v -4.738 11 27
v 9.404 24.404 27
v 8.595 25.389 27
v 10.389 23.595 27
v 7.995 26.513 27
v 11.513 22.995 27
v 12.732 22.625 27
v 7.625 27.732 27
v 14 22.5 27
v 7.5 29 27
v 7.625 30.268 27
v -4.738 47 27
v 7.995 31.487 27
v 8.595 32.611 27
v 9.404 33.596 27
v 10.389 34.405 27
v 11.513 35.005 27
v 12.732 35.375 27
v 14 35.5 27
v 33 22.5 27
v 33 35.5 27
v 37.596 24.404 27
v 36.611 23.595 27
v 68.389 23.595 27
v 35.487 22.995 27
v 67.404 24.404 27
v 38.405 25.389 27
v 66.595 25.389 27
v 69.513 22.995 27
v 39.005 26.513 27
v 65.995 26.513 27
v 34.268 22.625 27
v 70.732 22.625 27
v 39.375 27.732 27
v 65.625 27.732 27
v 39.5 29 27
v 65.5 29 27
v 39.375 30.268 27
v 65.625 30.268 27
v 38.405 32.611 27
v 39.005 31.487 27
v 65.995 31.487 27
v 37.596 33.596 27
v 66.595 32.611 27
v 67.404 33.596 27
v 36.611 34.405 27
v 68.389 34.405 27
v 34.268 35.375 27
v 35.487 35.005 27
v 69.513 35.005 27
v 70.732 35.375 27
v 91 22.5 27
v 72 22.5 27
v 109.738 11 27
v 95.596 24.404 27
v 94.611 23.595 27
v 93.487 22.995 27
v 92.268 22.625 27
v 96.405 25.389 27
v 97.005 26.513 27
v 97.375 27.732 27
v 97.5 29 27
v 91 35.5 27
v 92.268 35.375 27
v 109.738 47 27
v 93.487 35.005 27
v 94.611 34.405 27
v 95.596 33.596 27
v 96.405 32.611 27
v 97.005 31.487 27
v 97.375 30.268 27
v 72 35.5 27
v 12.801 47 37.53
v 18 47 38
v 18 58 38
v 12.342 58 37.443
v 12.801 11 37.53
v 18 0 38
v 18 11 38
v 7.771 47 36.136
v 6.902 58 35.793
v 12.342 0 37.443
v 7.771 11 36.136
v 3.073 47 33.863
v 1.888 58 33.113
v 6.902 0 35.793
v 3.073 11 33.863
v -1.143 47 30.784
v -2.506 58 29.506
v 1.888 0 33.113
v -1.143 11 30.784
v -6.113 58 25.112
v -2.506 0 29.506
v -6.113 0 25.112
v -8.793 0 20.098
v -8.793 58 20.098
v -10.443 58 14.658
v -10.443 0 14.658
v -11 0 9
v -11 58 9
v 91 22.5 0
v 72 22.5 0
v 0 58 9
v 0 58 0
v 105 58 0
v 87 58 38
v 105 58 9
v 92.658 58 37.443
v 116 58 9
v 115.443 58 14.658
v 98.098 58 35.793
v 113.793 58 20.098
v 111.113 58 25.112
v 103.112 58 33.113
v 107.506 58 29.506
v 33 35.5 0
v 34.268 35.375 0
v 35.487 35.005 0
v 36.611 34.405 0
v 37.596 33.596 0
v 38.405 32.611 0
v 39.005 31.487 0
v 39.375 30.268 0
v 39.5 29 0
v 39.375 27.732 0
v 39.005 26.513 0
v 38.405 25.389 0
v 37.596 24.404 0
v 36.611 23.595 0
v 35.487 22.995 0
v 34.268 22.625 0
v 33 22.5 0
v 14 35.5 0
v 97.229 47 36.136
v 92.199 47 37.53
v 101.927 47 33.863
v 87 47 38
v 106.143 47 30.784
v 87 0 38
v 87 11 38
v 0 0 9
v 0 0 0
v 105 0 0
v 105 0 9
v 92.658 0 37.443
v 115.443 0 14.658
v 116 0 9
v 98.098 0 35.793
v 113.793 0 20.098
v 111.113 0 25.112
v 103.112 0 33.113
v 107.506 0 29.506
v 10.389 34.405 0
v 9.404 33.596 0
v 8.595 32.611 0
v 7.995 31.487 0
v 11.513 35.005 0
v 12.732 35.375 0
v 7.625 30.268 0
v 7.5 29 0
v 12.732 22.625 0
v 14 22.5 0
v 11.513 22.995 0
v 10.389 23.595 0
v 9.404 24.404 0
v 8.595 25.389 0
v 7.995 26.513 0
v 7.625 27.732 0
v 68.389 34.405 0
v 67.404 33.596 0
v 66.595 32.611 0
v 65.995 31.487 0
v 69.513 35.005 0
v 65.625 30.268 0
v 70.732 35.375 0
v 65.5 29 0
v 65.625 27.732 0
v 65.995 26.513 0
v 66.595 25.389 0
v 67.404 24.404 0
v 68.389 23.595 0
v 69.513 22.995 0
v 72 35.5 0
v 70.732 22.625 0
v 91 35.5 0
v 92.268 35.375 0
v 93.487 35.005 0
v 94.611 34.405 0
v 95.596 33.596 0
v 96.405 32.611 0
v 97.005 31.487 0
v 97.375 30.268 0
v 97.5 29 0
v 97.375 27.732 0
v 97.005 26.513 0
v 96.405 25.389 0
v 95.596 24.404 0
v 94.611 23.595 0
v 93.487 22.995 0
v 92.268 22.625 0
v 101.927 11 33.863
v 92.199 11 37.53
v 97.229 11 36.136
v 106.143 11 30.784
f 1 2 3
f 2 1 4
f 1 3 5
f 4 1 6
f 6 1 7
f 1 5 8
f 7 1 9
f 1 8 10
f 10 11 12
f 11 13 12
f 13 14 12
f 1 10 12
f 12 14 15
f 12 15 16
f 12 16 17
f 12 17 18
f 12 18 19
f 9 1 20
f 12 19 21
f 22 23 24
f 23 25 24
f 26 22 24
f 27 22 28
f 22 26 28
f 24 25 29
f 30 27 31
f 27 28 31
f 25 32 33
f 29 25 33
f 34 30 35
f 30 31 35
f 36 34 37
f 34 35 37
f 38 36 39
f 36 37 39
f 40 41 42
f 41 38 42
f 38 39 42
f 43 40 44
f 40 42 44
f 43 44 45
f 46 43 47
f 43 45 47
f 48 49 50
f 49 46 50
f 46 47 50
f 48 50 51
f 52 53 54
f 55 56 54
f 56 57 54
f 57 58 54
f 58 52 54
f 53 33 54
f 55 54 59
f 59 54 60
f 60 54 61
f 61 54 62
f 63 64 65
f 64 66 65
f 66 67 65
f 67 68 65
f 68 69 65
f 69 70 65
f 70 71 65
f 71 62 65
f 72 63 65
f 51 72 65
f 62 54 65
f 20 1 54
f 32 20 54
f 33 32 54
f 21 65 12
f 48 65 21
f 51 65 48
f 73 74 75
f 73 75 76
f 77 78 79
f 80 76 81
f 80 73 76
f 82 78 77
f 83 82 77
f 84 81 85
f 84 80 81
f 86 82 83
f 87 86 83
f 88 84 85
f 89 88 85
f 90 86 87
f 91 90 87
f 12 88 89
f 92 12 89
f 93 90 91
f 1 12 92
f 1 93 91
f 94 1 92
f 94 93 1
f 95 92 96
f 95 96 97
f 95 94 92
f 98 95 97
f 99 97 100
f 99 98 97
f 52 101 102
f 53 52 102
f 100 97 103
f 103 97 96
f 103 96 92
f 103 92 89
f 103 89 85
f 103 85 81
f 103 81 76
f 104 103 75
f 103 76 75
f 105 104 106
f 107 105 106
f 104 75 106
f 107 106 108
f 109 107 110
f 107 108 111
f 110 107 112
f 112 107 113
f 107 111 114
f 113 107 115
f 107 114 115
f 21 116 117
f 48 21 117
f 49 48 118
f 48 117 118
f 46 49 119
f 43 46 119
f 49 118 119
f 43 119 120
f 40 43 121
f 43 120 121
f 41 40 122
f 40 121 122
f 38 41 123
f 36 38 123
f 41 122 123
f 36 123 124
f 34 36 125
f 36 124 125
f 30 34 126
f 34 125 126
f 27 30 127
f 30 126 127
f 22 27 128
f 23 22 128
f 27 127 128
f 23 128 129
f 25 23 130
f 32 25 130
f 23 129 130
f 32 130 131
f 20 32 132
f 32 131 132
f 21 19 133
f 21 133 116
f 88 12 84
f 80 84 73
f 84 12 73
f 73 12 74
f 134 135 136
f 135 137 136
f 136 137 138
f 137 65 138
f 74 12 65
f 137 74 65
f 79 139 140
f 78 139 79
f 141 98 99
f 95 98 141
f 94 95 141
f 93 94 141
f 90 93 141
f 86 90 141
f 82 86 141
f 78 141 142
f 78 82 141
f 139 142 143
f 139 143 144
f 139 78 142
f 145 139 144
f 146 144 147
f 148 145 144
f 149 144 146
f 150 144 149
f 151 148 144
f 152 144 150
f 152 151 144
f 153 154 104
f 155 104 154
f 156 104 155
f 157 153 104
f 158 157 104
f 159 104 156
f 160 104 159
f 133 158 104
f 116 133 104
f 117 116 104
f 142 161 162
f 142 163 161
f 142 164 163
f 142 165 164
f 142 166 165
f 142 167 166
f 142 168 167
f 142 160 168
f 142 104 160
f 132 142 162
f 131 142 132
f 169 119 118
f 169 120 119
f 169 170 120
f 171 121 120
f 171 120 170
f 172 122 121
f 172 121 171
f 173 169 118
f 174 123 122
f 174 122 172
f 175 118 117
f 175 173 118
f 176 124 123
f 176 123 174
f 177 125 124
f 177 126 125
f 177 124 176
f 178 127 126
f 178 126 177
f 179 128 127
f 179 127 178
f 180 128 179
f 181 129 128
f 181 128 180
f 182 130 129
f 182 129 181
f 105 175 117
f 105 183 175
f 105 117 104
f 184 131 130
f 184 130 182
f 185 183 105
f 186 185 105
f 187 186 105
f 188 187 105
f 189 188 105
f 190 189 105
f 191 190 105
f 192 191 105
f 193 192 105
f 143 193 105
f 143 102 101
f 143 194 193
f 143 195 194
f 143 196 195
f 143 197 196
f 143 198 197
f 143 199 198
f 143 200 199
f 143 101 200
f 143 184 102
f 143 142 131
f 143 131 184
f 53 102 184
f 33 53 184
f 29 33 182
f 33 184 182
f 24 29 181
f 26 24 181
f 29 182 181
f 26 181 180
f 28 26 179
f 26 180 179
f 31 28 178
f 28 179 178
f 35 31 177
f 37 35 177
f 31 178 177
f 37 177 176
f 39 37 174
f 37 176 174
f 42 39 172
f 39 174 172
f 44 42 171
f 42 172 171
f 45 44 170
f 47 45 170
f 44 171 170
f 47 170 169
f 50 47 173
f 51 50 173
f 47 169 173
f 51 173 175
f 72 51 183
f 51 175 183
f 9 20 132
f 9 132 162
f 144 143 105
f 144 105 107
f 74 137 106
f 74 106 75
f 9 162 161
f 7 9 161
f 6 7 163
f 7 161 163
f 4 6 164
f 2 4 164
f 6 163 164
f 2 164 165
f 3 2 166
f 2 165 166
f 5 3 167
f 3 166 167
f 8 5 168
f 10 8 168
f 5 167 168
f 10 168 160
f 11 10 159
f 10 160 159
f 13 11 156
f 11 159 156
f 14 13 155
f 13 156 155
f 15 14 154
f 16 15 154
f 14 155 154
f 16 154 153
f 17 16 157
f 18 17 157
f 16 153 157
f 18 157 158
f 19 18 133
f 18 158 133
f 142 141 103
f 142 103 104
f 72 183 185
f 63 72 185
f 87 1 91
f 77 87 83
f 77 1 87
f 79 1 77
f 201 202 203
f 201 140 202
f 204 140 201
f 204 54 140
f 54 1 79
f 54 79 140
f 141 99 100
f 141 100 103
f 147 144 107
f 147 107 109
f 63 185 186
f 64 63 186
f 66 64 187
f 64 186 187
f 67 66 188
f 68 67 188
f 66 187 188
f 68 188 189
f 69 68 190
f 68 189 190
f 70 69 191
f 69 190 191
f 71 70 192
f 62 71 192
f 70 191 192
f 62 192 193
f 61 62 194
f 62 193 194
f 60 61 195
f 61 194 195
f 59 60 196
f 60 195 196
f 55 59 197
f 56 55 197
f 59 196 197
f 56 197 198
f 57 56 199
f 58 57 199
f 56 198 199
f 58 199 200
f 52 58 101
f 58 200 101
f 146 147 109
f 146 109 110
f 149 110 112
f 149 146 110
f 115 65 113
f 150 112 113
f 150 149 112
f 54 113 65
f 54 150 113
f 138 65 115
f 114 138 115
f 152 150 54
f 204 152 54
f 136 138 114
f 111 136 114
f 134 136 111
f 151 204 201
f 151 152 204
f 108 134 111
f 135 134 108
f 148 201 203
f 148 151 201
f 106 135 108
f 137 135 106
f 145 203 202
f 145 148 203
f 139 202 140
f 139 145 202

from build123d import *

# Parameters (mm, degrees)
F1_DEPTH = 58
F2_W     = 36
F2_H     = 11
F3_DEPTH = 150
F5_DEPTH = 60


with BuildPart() as f1:
    # F0 (on Front) → F1 (new body)
    with BuildSketch(Plane.XZ):
        with BuildLine():
            Line((0, 9), (0, 0))
            Line((0, 0), (105, 0))
            Line((105, 0), (105, 9))
            Line((105, 9), (116, 9))
            ThreePointArc((116, 9), (107.506097, 29.506097), (87, 38))
            Line((87, 38), (18, 38))
            ThreePointArc((18, 38), (-2.506097, 29.506097), (-11, 9))
            Line((-11, 9), (0, 9))
        make_face()
    extrude(amount=-F1_DEPTH)

    # F2 (on Right) → F3 (cut, symmetric)
    with BuildSketch(Plane.YZ):
        with Locations((29, 32.5)):
            Rectangle(F2_W, F2_H)
    extrude(amount=F3_DEPTH, both=True, mode=Mode.SUBTRACT)

    # F4 (on face) → F5 (cut)
    with BuildSketch(Plane(origin=(0, 0, 0), x_dir=(1, 0, 0), z_dir=(0, 0, -1))):
        with BuildLine():
            Line((91, -22.5), (72, -22.5))
            ThreePointArc((72, -22.5), (65.5, -29), (72, -35.5))
            Line((72, -35.5), (91, -35.5))
            ThreePointArc((91, -35.5), (97.5, -29), (91, -22.5))
        make_face()
        with BuildLine():
            Line((33, -22.5), (14, -22.5))
            ThreePointArc((14, -22.5), (7.5, -29), (14, -35.5))
            Line((14, -35.5), (33, -35.5))
            ThreePointArc((33, -35.5), (39.5, -29), (33, -22.5))
        make_face()
    extrude(amount=-F5_DEPTH, mode=Mode.SUBTRACT)


solid = f1.part
